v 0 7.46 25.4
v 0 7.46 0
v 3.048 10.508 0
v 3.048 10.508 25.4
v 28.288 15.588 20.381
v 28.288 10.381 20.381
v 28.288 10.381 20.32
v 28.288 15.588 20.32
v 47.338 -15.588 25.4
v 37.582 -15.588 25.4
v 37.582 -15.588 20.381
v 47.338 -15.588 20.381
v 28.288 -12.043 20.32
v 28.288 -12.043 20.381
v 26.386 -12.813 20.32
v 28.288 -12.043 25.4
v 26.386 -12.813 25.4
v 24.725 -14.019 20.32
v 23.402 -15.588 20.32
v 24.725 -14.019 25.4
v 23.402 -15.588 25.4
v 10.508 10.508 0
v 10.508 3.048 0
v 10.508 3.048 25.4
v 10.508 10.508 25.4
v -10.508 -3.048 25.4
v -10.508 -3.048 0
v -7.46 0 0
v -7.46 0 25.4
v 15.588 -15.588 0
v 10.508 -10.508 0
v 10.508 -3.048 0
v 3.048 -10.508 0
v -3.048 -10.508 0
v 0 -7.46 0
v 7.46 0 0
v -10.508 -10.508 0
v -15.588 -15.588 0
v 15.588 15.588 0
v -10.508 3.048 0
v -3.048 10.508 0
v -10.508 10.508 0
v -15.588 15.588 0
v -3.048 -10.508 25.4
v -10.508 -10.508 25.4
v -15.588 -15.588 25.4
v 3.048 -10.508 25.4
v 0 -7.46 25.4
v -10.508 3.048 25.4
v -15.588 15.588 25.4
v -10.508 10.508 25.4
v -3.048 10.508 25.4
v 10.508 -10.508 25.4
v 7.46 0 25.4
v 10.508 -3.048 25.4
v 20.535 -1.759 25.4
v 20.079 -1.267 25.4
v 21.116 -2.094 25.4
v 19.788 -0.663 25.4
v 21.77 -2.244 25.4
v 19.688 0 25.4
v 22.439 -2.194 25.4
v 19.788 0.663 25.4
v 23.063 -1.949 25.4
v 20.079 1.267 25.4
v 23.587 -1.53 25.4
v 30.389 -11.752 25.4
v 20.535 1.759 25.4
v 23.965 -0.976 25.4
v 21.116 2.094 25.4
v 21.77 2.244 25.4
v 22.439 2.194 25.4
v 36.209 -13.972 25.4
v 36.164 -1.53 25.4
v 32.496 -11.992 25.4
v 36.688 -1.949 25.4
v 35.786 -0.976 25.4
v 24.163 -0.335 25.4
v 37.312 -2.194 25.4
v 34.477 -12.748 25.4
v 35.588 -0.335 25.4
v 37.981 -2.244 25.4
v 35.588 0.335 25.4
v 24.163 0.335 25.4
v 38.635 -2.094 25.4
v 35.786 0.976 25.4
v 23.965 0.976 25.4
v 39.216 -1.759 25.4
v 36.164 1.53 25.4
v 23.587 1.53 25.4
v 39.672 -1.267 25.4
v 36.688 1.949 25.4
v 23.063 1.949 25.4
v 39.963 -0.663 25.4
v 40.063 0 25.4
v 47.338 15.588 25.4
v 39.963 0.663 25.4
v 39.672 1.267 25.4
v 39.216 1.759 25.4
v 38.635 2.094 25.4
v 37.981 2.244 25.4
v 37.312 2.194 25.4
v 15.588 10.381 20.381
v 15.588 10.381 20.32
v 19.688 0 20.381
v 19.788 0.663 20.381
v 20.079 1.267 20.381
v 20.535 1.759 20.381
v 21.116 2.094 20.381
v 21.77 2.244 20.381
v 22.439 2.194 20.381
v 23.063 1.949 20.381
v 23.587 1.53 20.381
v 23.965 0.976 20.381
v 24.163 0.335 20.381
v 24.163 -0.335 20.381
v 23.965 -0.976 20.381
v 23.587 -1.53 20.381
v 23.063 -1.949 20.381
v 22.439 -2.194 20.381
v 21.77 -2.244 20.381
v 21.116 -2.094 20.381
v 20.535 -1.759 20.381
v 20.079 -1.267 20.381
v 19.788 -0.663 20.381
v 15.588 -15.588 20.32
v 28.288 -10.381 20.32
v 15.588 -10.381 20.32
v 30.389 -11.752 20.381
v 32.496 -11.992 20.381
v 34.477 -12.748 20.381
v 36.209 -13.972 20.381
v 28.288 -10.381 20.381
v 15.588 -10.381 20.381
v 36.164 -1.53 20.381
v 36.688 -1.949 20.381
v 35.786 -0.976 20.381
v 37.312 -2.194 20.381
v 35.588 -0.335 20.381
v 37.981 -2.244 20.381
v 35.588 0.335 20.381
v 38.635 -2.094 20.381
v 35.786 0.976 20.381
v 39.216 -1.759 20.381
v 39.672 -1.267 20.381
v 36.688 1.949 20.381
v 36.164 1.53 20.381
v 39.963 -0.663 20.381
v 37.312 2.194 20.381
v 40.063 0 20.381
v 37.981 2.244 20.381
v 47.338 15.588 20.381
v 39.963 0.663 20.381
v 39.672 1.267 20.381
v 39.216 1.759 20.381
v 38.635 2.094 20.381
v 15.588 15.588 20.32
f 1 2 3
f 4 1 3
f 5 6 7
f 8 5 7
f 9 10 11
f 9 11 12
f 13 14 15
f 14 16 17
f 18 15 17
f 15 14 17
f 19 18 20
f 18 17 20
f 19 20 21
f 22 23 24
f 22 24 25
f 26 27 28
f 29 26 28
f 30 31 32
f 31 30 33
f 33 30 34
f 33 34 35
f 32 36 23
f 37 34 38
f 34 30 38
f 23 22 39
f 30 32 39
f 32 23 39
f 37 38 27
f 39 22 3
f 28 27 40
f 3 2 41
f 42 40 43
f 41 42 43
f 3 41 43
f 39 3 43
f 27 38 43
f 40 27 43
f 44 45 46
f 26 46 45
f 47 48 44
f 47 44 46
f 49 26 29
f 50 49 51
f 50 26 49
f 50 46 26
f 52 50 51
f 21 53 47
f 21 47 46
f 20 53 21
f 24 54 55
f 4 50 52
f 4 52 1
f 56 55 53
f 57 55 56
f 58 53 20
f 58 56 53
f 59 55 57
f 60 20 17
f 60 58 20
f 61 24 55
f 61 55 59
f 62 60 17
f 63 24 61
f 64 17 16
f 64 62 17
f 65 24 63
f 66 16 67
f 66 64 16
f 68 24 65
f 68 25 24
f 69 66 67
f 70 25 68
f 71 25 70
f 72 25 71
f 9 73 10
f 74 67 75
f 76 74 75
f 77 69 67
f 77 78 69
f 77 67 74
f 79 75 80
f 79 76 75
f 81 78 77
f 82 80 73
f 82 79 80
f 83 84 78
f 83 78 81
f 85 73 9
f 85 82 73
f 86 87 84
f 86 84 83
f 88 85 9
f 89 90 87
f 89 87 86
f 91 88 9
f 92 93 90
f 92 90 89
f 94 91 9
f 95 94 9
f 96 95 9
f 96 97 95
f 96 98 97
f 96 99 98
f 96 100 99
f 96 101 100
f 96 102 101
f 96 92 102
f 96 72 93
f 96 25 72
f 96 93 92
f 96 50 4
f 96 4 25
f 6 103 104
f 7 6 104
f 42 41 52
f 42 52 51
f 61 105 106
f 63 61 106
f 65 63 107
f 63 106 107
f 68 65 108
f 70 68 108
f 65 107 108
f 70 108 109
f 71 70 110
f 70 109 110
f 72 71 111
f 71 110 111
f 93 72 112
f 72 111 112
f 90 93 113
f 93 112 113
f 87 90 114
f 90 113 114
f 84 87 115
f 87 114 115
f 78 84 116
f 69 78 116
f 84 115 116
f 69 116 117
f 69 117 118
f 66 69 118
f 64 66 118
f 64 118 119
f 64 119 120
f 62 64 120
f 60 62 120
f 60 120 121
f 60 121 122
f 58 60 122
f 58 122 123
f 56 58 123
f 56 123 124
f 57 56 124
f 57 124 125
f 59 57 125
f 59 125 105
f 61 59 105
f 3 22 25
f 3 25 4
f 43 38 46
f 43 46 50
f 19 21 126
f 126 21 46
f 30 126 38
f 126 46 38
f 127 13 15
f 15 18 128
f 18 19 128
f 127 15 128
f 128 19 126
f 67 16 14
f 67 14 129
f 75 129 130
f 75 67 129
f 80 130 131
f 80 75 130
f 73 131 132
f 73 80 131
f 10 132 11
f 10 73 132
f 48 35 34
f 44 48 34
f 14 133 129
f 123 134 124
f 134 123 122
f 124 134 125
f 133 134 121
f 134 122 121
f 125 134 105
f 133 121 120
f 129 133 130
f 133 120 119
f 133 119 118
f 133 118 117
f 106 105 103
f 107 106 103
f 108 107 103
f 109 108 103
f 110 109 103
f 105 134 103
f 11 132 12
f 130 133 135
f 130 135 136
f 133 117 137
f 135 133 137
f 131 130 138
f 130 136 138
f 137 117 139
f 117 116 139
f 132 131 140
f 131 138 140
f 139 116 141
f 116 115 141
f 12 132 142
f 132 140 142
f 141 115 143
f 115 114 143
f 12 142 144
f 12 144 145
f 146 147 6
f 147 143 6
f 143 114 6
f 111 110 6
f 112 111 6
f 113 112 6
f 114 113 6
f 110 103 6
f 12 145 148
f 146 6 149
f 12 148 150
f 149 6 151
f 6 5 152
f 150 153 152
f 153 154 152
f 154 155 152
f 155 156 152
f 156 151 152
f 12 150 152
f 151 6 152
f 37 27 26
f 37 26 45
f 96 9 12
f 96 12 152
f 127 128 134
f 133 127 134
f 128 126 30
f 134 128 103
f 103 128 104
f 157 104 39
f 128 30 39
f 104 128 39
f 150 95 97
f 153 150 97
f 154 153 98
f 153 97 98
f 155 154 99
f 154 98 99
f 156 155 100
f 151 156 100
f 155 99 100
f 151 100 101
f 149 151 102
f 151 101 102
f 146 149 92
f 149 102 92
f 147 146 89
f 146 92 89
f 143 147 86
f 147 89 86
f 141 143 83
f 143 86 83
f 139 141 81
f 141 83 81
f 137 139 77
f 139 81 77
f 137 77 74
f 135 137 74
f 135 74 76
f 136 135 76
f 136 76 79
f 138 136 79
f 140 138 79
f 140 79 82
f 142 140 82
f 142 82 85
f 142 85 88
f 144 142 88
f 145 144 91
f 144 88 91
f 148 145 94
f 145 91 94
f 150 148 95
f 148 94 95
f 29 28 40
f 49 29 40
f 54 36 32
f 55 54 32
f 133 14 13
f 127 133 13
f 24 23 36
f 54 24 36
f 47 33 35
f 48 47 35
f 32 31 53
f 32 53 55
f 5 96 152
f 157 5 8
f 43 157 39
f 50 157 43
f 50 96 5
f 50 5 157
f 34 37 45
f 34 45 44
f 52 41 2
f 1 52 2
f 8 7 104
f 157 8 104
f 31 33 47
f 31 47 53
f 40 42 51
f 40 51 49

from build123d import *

# Parameters (mm, degrees)
SKETCH1_W            = 31.176
SKETCH1_H            = 31.176
BOSS_EXTRUDE1_DEPTH  = 25.4
BOSS_EXTRUDE2_DEPTH  = 12.7
CUT_EXTRUDE1_DEPTH   = 12.7
SKETCH29_R           = 8.46875
CUT_EXTRUDE10_DEPTH  = 42.089617764
CUT_EXTRUDE11_DEPTH  = 50.166186754
SKETCH30_R           = 2.25
BOSS_EXTRUDE15_DEPTH = 5.019


with BuildPart() as part:
    # Sketch1 → Boss-Extrude1 (new body)
    with BuildSketch(Plane.XY):
        Rectangle(SKETCH1_W, SKETCH1_H)
        Polygon((2.54, -10), (3.048, -10.508), (10.508, -10.508), (10.508, -3.048), (10, -2.54), (7.46, 0), (10, 2.54), (10.508, 3.048), (10.508, 10.508), (3.048, 10.508), (2.54, 10), (0, 7.46), (-2.54, 10), (-3.048, 10.508), (-10.508, 10.508), (-10.508, 3.048), (-10, 2.54), (-7.46, 0), (-10, -2.54), (-10.508, -3.048), (-10.508, -10.508), (-3.048, -10.508), (-2.54, -10), (0, -7.46), align=None, mode=Mode.SUBTRACT)
    extrude(amount=BOSS_EXTRUDE1_DEPTH)

    # Sketch3 → Boss-Extrude2 (add)
    with BuildSketch(Plane(origin=(15.588, 0, 0), x_dir=(0, 0, -1), z_dir=(1, 0, 0))):
        Polygon((-20.381, 10.381), (0, 10.381), (0, 15.588), (-25.4, 15.588), (-25.4, -15.588), (0, -15.588), (0, -10.381), (-20.381, -10.381), align=None)
    extrude(amount=BOSS_EXTRUDE2_DEPTH)

    # Sketch4 → Cut-Extrude1 (cut)
    with BuildSketch(Plane(origin=(0, 0, 20.381), x_dir=(-1, 0, 0), z_dir=(0, 0, -1))):
        with BuildLine():
            ThreePointArc((-24.188, 0), (-21.938, -2.25), (-19.688, 0))
            Line((-19.688, 0), (-24.188, 0))
        make_face()
        with BuildLine():
            Line((-24.188, 0), (-19.688, 0))
            ThreePointArc((-19.688, 0), (-21.938, 2.25), (-24.188, 0))
        make_face()
    extrude(amount=-CUT_EXTRUDE1_DEPTH, mode=Mode.SUBTRACT)

    # Sketch29 → Cut-Extrude10 (cut, through all)
    with BuildSketch(Plane.XY.offset(25.4)):
        with Locations((30.492, -20.220089154)):
            Circle(SKETCH29_R)
    extrude(amount=-CUT_EXTRUDE10_DEPTH, mode=Mode.SUBTRACT)

    # Sketch5 → Cut-Extrude11 (cut, through all)
    with BuildSketch(Plane.XZ.offset(15.588)):
        with BuildLine():
            Line((24.188, 10.32), (28.288, 10.32))
            Line((28.288, 10.32), (28.288, 20.32))
            Line((28.288, 20.32), (15.588, 20.32))
            Line((15.588, 20.32), (15.588, 10.32))
            Line((15.588, 10.32), (19.688, 10.32))
            ThreePointArc((19.688, 10.32), (21.938, 12.57), (24.188, 10.32))
        make_face()
        with BuildLine():
            Line((15.588, 0), (28.288, 0))
            Line((28.288, 0), (28.288, 10.32))
            Line((28.288, 10.32), (24.188, 10.32))
            ThreePointArc((24.188, 10.32), (21.938, 8.07), (19.688, 10.32))
            Line((19.688, 10.32), (15.588, 10.32))
            Line((15.588, 10.32), (15.588, 0))
        make_face()
        with BuildLine():
            ThreePointArc((19.688, 10.32), (21.938, 8.07), (24.188, 10.32))
            Line((24.188, 10.32), (19.688, 10.32))
        make_face()
        with BuildLine():
            Line((19.688, 10.32), (24.188, 10.32))
            ThreePointArc((24.188, 10.32), (21.938, 12.57), (19.688, 10.32))
        make_face()
    extrude(amount=-CUT_EXTRUDE11_DEPTH, mode=Mode.SUBTRACT)

    # Sketch30 → Boss-Extrude15 (add)
    with BuildSketch(Plane.XY.offset(25.4)):
        with BuildLine():
            Line((47.338, 15.588), (28.288, 15.588))
            Line((28.288, 15.588), (28.288, -12.043163658))
            ThreePointArc((28.288, -12.043163658), (33.510098515, -12.307389999), (37.581673944, -15.588))
            Line((37.581673944, -15.588), (47.338, -15.588))
            Line((47.338, -15.588), (47.338, 15.588))
        make_face()
        with Locations((37.813, 0)):
            Circle(SKETCH30_R, mode=Mode.SUBTRACT)
    extrude(amount=-BOSS_EXTRUDE15_DEPTH)


solid = part.part
